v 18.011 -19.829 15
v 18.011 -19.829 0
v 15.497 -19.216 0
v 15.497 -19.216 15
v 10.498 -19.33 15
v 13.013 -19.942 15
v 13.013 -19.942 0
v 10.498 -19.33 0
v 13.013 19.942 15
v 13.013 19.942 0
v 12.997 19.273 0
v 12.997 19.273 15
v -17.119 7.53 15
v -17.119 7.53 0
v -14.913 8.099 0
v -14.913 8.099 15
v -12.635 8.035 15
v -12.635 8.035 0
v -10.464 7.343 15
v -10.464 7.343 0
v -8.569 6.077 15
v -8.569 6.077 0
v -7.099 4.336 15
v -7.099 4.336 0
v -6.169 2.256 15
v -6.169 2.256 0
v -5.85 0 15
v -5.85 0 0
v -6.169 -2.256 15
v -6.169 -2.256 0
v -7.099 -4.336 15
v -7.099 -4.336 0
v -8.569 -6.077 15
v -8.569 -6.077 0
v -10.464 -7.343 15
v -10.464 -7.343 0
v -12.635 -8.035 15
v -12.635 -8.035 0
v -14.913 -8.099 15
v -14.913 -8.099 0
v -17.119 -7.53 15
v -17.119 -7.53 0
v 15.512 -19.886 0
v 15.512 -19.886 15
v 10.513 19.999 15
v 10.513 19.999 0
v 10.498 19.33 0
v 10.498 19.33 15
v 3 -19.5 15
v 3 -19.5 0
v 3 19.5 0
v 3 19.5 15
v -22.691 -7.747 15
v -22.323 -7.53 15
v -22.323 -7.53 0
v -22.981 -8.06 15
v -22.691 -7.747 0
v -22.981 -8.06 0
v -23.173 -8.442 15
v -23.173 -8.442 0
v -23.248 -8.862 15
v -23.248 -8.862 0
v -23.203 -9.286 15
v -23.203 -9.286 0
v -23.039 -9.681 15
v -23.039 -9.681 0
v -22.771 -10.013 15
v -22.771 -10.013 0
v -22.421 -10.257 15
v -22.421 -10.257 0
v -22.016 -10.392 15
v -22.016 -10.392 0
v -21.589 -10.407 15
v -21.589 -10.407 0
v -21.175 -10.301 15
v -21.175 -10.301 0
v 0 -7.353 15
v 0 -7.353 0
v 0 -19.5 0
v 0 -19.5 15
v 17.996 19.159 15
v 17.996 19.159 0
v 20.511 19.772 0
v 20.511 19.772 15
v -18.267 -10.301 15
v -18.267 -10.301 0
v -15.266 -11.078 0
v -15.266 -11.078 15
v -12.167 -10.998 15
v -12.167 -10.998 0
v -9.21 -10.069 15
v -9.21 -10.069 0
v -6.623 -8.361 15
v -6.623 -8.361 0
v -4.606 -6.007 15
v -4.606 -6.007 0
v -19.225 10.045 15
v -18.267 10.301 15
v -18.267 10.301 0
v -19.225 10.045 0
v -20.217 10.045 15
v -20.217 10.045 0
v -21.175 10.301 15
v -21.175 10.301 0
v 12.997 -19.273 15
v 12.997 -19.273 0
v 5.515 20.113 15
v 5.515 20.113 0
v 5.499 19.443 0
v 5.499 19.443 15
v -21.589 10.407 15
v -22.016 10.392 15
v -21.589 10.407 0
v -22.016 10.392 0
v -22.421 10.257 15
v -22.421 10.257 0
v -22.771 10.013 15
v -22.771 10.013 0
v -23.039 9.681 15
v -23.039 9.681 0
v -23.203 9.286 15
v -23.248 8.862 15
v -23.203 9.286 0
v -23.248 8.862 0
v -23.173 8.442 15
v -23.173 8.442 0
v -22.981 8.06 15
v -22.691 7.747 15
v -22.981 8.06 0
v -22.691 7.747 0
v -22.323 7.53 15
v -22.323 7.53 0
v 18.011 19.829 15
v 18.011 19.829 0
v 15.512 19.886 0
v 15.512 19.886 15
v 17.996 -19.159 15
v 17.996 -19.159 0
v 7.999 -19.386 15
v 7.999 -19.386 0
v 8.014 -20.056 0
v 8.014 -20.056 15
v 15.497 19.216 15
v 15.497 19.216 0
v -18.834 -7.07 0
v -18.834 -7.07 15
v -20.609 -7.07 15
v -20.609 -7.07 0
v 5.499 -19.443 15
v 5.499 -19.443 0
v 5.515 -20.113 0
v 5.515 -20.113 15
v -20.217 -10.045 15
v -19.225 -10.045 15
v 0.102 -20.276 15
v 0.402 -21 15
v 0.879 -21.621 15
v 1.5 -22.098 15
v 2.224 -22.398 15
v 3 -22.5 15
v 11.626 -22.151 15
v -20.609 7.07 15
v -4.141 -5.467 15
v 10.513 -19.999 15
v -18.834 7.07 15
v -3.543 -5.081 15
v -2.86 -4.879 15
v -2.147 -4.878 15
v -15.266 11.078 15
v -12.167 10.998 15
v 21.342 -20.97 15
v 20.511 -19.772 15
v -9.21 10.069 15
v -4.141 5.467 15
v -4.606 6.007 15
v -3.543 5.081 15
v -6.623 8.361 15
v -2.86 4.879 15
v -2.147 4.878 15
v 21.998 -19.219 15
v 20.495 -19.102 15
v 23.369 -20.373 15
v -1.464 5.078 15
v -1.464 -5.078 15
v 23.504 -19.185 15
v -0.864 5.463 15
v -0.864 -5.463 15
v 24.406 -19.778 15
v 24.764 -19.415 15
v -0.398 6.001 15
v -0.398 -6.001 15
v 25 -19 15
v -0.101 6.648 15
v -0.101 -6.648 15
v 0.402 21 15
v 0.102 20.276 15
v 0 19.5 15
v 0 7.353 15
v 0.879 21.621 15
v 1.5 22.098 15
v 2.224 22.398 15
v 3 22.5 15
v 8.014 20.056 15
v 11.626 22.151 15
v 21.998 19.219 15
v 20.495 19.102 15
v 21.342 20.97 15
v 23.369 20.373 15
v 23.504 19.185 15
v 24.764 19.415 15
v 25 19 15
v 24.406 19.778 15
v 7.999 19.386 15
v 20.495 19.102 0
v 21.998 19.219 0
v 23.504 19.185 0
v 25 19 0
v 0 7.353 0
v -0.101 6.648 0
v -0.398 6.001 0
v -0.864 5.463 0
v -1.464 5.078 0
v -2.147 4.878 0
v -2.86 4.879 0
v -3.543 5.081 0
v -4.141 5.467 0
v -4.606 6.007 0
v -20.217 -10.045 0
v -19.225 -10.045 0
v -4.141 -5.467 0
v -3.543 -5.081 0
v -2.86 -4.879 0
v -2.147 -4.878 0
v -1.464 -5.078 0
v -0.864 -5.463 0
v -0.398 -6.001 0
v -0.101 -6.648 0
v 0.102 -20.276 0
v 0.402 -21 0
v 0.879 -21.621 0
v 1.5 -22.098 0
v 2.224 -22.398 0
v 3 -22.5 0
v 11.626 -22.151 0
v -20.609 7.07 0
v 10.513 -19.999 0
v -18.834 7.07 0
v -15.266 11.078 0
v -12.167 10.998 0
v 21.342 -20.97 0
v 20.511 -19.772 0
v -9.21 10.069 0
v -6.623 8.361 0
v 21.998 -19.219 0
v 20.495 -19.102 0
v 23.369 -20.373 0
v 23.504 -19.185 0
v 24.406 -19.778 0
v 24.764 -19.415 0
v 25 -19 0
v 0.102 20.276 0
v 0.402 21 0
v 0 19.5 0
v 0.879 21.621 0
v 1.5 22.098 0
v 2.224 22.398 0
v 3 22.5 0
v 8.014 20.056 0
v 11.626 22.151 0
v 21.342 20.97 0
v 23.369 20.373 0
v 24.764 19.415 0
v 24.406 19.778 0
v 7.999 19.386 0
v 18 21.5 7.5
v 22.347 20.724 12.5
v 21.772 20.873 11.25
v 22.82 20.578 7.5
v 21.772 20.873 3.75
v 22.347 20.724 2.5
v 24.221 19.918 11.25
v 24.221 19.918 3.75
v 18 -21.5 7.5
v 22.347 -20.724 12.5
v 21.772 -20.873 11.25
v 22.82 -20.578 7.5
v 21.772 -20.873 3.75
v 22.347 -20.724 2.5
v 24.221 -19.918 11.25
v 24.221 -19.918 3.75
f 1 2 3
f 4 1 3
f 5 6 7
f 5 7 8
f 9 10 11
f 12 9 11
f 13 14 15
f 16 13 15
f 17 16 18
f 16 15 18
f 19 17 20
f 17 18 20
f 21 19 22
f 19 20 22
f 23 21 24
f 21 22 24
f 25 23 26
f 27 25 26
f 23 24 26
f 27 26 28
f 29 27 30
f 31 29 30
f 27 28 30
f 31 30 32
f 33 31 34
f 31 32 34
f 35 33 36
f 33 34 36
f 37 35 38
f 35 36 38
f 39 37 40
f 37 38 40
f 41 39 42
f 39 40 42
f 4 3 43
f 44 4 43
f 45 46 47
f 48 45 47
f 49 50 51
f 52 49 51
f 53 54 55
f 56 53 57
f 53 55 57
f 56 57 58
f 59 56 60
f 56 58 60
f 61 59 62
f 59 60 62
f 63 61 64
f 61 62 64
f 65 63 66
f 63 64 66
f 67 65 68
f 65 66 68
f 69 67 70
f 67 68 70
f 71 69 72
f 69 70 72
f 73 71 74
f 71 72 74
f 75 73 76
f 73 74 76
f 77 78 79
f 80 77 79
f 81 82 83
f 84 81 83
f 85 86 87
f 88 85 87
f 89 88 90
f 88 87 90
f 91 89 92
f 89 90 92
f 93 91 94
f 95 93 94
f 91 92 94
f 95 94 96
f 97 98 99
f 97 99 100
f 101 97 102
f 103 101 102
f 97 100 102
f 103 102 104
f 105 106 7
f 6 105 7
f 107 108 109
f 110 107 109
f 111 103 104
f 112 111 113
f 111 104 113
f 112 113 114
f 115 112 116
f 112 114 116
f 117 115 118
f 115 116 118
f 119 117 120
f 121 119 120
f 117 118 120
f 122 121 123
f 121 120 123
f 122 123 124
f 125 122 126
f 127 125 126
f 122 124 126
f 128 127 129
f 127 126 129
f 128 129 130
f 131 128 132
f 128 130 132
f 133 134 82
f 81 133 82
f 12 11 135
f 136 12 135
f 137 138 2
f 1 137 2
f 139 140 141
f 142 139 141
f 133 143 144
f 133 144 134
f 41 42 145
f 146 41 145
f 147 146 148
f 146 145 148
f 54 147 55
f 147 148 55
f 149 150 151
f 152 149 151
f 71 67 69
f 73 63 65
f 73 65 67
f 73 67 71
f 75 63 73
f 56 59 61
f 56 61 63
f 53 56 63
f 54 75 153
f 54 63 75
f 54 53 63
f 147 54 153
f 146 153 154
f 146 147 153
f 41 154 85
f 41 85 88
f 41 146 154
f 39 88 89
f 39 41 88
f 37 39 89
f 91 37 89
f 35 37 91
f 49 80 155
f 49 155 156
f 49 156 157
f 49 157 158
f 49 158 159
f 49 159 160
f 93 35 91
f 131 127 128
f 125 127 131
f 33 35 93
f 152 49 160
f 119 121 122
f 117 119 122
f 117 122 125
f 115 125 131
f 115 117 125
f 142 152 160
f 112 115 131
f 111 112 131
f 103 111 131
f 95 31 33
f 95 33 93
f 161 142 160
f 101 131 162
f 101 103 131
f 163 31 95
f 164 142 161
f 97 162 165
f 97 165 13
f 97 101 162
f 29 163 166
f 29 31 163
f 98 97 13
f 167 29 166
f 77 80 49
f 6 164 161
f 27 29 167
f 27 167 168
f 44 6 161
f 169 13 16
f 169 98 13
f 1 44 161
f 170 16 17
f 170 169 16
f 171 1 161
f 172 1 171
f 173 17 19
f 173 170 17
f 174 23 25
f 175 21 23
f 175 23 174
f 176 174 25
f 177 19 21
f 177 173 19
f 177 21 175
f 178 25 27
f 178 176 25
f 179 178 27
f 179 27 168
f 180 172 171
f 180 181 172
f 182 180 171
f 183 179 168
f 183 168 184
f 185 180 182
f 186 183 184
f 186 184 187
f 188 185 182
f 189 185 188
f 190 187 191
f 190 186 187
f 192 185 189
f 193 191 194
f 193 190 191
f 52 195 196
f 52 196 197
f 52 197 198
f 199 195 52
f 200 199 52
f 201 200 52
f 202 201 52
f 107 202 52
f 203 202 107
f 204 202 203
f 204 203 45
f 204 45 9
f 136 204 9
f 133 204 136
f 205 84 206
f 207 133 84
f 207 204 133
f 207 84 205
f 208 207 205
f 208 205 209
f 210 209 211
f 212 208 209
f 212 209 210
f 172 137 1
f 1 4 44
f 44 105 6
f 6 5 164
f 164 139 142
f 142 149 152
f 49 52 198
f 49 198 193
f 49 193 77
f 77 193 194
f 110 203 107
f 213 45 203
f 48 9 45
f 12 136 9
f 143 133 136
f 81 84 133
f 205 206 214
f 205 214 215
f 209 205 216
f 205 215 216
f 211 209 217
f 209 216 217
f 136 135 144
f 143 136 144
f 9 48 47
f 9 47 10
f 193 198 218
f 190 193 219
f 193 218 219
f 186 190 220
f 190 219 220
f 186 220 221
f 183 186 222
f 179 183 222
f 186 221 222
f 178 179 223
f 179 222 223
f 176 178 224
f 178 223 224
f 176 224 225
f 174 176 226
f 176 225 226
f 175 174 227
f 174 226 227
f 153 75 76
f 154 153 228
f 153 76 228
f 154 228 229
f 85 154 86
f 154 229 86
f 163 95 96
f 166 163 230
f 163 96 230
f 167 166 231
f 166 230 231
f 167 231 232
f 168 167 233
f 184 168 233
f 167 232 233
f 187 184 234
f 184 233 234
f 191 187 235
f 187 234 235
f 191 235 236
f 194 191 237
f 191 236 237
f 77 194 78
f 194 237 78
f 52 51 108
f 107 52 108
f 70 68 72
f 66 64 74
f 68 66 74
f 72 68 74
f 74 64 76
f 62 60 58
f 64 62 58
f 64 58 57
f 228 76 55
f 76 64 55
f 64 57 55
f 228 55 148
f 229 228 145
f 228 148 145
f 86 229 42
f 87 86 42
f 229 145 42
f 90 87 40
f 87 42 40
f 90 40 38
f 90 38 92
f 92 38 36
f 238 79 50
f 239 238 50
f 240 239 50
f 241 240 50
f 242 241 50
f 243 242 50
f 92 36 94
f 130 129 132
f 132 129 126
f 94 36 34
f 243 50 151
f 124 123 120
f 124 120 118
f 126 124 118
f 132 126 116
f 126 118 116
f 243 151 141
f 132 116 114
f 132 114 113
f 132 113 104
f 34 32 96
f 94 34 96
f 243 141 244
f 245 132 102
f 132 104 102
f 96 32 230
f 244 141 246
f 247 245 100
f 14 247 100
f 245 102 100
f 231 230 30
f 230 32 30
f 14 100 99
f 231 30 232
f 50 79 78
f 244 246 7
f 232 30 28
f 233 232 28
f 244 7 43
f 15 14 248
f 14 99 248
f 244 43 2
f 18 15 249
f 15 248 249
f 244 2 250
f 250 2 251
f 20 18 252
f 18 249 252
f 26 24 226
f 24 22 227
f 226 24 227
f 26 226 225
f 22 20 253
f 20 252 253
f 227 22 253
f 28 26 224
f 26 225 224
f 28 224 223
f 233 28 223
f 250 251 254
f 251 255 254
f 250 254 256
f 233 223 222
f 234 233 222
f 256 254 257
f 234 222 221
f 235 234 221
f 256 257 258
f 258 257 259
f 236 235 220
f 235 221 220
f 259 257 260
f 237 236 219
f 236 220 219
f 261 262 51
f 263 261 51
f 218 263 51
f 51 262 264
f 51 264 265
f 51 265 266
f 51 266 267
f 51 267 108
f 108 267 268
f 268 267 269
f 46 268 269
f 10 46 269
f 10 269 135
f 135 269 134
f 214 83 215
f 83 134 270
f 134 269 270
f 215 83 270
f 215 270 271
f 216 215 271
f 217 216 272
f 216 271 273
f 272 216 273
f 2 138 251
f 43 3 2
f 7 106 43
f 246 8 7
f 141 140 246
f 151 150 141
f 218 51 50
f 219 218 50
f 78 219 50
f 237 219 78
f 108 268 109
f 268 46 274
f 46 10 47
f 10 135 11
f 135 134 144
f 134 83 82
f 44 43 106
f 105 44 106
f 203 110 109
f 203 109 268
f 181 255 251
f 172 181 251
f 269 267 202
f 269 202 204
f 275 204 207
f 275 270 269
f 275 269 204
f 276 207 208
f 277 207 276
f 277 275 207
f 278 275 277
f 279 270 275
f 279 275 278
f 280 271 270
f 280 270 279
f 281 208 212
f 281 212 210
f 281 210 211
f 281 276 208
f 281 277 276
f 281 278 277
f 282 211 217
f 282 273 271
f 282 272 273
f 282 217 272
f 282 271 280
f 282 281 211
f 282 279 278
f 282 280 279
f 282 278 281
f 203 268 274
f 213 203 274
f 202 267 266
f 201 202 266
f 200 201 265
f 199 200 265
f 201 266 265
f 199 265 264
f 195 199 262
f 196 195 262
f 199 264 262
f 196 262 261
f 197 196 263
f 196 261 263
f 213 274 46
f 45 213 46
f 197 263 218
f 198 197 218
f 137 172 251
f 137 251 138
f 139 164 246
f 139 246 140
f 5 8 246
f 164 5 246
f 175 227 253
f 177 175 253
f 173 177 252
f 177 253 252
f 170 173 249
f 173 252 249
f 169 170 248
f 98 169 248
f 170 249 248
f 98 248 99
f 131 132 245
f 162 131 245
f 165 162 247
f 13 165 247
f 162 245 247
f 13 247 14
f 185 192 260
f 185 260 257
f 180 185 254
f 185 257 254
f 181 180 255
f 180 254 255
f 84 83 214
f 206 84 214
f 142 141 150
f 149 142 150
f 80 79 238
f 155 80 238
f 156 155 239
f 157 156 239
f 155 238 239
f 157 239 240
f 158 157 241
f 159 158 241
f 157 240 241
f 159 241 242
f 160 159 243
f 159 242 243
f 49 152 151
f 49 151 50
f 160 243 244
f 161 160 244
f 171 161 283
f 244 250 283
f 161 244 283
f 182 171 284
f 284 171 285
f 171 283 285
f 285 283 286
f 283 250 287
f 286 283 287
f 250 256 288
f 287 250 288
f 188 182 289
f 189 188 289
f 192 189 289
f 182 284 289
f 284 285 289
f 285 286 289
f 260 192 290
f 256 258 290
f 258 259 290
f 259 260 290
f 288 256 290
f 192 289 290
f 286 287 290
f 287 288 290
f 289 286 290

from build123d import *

# Parameters (mm, degrees)
F1_DEPTH = 15


with BuildPart() as f1:
    # F0 (on Top) → F1 (new body)
    with BuildSketch(Plane.XY):
        with BuildLine():
            ThreePointArc((-17.1188699738, 7.52961819), (-5.85, 0), (-17.1188699738, -7.52961819))
            ThreePointArc((-17.1188699738, -7.52961819), (-19.7211173139, -7.011999011), (-22.3233646539, -7.52961819))
            ThreePointArc((-22.3233646539, -7.52961819), (-23.1351588042, -9.4894626373), (-21.1753143568, -10.3012567875))
            ThreePointArc((-21.1753143568, -10.3012567875), (-19.7211173139, -10.011999011), (-18.2669202709, -10.3012567875))
            ThreePointArc((-18.2669202709, -10.3012567875), (-10.6560319472, -10.6367465732), (-4.6062271062, -6.006623912))
            ThreePointArc((-4.6062271062, -6.006623912), (-2.85, 0), (-4.6062271062, 6.006623912))
            ThreePointArc((-4.6062271062, 6.006623912), (-10.6560319472, 10.6367465732), (-18.2669202709, 10.3012567875))
            ThreePointArc((-18.2669202709, 10.3012567875), (-19.7211173139, 10.011999011), (-21.1753143568, 10.3012567875))
            ThreePointArc((-21.1753143568, 10.3012567875), (-23.1351588042, 9.4894626373), (-22.3233646539, 7.52961819))
            ThreePointArc((-22.3233646539, 7.52961819), (-19.7211173139, 7.011999011), (-17.1188699738, 7.52961819))
        make_face()
        with BuildLine():
            ThreePointArc((-4.6062271062, 6.006623912), (-2.85, 0), (-4.6062271062, -6.006623912))
            ThreePointArc((-4.6062271062, -6.006623912), (-1.7984188449, -4.9538623094), (0, -7.3534005739))
            Line((0, -7.3534005739), (0, 0))
            Line((0, 0), (0, 7.3534005739))
            ThreePointArc((0, 7.3534005739), (-1.7984188449, 4.9538623094), (-4.6062271062, 6.006623912))
        make_face()
        with BuildLine():
            Line((0, 19.5), (0, 7.3534005739))
            Line((0, 7.3534005739), (0, 0))
            Line((0, 0), (3, 0))
            Line((3, 0), (3, 19.5))
            Line((3, 19.5), (5.5145750444, 20.1128965303))
            Line((5.5145750444, 20.1128965303), (5.4993545889, 19.4431964866))
            Line((5.4993545889, 19.4431964866), (8.0139296333, 20.0560930169))
            Line((8.0139296333, 20.0560930169), (7.9987091777, 19.3863929732))
            Line((7.9987091777, 19.3863929732), (10.5132842221, 19.9992895035))
            Line((10.5132842221, 19.9992895035), (10.4980637666, 19.3295894599))
            Line((10.4980637666, 19.3295894599), (13.012638811, 19.9424859902))
            Line((13.012638811, 19.9424859902), (12.9974183554, 19.2727859465))
            Line((12.9974183554, 19.2727859465), (15.5119933999, 19.8856824768))
            Line((15.5119933999, 19.8856824768), (15.4967729443, 19.2159824331))
            Line((15.4967729443, 19.2159824331), (18.0113479887, 19.8288789634))
            Line((18.0113479887, 19.8288789634), (17.9961275332, 19.1591789197))
            Line((17.9961275332, 19.1591789197), (20.5107025776, 19.77207545))
            Line((20.5107025776, 19.77207545), (20.495482122, 19.1023754063))
            ThreePointArc((20.495482122, 19.1023754063), (22.7516069101, 19.2212850643), (25, 19))
            add(Edge.make_bspline(
                [(3, 22.5), (8, 22.5), (16.9649489174, 21.8239376647), (24.4, 20.55), (25, 19)],
                knots=[0, 0, 0, 0, 0.5871428907, 1, 1, 1, 1], degree=3))
            ThreePointArc((3, 22.5), (0.8786796564, 21.6213203436), (0, 19.5))
        make_face()
        with BuildLine():
            Line((0, 0), (0, -7.3534005739))
            Line((0, -7.3534005739), (0, -19.5))
            ThreePointArc((0, -19.5), (0.8786796564, -21.6213203436), (3, -22.5))
            add(Edge.make_bspline(
                [(3, -22.5), (8, -22.5), (16.9649489174, -21.8239376647), (24.4, -20.55), (25, -19)],
                knots=[0, 0, 0, 0, 0.5871428907, 1, 1, 1, 1], degree=3))
            ThreePointArc((25, -19), (22.7516069101, -19.2212850643), (20.495482122, -19.1023754063))
            Line((20.495482122, -19.1023754063), (20.5107025776, -19.77207545))
            Line((20.5107025776, -19.77207545), (17.9961275332, -19.1591789197))
            Line((17.9961275332, -19.1591789197), (18.0113479887, -19.8288789634))
            Line((18.0113479887, -19.8288789634), (15.4967729443, -19.2159824331))
            Line((15.4967729443, -19.2159824331), (15.5119933999, -19.8856824768))
            Line((15.5119933999, -19.8856824768), (12.9974183554, -19.2727859465))
            Line((12.9974183554, -19.2727859465), (13.012638811, -19.9424859902))
            Line((13.012638811, -19.9424859902), (10.4980637666, -19.3295894599))
            Line((10.4980637666, -19.3295894599), (10.5132842221, -19.9992895035))
            Line((10.5132842221, -19.9992895035), (7.9987091777, -19.3863929732))
            Line((7.9987091777, -19.3863929732), (8.0139296333, -20.0560930169))
            Line((8.0139296333, -20.0560930169), (5.4993545889, -19.4431964866))
            Line((5.4993545889, -19.4431964866), (5.5145750444, -20.1128965303))
            Line((5.5145750444, -20.1128965303), (3, -19.5))
            Line((3, -19.5), (3, 0))
            Line((3, 0), (0, 0))
        make_face()
    extrude(amount=F1_DEPTH)


solid = f1.part
